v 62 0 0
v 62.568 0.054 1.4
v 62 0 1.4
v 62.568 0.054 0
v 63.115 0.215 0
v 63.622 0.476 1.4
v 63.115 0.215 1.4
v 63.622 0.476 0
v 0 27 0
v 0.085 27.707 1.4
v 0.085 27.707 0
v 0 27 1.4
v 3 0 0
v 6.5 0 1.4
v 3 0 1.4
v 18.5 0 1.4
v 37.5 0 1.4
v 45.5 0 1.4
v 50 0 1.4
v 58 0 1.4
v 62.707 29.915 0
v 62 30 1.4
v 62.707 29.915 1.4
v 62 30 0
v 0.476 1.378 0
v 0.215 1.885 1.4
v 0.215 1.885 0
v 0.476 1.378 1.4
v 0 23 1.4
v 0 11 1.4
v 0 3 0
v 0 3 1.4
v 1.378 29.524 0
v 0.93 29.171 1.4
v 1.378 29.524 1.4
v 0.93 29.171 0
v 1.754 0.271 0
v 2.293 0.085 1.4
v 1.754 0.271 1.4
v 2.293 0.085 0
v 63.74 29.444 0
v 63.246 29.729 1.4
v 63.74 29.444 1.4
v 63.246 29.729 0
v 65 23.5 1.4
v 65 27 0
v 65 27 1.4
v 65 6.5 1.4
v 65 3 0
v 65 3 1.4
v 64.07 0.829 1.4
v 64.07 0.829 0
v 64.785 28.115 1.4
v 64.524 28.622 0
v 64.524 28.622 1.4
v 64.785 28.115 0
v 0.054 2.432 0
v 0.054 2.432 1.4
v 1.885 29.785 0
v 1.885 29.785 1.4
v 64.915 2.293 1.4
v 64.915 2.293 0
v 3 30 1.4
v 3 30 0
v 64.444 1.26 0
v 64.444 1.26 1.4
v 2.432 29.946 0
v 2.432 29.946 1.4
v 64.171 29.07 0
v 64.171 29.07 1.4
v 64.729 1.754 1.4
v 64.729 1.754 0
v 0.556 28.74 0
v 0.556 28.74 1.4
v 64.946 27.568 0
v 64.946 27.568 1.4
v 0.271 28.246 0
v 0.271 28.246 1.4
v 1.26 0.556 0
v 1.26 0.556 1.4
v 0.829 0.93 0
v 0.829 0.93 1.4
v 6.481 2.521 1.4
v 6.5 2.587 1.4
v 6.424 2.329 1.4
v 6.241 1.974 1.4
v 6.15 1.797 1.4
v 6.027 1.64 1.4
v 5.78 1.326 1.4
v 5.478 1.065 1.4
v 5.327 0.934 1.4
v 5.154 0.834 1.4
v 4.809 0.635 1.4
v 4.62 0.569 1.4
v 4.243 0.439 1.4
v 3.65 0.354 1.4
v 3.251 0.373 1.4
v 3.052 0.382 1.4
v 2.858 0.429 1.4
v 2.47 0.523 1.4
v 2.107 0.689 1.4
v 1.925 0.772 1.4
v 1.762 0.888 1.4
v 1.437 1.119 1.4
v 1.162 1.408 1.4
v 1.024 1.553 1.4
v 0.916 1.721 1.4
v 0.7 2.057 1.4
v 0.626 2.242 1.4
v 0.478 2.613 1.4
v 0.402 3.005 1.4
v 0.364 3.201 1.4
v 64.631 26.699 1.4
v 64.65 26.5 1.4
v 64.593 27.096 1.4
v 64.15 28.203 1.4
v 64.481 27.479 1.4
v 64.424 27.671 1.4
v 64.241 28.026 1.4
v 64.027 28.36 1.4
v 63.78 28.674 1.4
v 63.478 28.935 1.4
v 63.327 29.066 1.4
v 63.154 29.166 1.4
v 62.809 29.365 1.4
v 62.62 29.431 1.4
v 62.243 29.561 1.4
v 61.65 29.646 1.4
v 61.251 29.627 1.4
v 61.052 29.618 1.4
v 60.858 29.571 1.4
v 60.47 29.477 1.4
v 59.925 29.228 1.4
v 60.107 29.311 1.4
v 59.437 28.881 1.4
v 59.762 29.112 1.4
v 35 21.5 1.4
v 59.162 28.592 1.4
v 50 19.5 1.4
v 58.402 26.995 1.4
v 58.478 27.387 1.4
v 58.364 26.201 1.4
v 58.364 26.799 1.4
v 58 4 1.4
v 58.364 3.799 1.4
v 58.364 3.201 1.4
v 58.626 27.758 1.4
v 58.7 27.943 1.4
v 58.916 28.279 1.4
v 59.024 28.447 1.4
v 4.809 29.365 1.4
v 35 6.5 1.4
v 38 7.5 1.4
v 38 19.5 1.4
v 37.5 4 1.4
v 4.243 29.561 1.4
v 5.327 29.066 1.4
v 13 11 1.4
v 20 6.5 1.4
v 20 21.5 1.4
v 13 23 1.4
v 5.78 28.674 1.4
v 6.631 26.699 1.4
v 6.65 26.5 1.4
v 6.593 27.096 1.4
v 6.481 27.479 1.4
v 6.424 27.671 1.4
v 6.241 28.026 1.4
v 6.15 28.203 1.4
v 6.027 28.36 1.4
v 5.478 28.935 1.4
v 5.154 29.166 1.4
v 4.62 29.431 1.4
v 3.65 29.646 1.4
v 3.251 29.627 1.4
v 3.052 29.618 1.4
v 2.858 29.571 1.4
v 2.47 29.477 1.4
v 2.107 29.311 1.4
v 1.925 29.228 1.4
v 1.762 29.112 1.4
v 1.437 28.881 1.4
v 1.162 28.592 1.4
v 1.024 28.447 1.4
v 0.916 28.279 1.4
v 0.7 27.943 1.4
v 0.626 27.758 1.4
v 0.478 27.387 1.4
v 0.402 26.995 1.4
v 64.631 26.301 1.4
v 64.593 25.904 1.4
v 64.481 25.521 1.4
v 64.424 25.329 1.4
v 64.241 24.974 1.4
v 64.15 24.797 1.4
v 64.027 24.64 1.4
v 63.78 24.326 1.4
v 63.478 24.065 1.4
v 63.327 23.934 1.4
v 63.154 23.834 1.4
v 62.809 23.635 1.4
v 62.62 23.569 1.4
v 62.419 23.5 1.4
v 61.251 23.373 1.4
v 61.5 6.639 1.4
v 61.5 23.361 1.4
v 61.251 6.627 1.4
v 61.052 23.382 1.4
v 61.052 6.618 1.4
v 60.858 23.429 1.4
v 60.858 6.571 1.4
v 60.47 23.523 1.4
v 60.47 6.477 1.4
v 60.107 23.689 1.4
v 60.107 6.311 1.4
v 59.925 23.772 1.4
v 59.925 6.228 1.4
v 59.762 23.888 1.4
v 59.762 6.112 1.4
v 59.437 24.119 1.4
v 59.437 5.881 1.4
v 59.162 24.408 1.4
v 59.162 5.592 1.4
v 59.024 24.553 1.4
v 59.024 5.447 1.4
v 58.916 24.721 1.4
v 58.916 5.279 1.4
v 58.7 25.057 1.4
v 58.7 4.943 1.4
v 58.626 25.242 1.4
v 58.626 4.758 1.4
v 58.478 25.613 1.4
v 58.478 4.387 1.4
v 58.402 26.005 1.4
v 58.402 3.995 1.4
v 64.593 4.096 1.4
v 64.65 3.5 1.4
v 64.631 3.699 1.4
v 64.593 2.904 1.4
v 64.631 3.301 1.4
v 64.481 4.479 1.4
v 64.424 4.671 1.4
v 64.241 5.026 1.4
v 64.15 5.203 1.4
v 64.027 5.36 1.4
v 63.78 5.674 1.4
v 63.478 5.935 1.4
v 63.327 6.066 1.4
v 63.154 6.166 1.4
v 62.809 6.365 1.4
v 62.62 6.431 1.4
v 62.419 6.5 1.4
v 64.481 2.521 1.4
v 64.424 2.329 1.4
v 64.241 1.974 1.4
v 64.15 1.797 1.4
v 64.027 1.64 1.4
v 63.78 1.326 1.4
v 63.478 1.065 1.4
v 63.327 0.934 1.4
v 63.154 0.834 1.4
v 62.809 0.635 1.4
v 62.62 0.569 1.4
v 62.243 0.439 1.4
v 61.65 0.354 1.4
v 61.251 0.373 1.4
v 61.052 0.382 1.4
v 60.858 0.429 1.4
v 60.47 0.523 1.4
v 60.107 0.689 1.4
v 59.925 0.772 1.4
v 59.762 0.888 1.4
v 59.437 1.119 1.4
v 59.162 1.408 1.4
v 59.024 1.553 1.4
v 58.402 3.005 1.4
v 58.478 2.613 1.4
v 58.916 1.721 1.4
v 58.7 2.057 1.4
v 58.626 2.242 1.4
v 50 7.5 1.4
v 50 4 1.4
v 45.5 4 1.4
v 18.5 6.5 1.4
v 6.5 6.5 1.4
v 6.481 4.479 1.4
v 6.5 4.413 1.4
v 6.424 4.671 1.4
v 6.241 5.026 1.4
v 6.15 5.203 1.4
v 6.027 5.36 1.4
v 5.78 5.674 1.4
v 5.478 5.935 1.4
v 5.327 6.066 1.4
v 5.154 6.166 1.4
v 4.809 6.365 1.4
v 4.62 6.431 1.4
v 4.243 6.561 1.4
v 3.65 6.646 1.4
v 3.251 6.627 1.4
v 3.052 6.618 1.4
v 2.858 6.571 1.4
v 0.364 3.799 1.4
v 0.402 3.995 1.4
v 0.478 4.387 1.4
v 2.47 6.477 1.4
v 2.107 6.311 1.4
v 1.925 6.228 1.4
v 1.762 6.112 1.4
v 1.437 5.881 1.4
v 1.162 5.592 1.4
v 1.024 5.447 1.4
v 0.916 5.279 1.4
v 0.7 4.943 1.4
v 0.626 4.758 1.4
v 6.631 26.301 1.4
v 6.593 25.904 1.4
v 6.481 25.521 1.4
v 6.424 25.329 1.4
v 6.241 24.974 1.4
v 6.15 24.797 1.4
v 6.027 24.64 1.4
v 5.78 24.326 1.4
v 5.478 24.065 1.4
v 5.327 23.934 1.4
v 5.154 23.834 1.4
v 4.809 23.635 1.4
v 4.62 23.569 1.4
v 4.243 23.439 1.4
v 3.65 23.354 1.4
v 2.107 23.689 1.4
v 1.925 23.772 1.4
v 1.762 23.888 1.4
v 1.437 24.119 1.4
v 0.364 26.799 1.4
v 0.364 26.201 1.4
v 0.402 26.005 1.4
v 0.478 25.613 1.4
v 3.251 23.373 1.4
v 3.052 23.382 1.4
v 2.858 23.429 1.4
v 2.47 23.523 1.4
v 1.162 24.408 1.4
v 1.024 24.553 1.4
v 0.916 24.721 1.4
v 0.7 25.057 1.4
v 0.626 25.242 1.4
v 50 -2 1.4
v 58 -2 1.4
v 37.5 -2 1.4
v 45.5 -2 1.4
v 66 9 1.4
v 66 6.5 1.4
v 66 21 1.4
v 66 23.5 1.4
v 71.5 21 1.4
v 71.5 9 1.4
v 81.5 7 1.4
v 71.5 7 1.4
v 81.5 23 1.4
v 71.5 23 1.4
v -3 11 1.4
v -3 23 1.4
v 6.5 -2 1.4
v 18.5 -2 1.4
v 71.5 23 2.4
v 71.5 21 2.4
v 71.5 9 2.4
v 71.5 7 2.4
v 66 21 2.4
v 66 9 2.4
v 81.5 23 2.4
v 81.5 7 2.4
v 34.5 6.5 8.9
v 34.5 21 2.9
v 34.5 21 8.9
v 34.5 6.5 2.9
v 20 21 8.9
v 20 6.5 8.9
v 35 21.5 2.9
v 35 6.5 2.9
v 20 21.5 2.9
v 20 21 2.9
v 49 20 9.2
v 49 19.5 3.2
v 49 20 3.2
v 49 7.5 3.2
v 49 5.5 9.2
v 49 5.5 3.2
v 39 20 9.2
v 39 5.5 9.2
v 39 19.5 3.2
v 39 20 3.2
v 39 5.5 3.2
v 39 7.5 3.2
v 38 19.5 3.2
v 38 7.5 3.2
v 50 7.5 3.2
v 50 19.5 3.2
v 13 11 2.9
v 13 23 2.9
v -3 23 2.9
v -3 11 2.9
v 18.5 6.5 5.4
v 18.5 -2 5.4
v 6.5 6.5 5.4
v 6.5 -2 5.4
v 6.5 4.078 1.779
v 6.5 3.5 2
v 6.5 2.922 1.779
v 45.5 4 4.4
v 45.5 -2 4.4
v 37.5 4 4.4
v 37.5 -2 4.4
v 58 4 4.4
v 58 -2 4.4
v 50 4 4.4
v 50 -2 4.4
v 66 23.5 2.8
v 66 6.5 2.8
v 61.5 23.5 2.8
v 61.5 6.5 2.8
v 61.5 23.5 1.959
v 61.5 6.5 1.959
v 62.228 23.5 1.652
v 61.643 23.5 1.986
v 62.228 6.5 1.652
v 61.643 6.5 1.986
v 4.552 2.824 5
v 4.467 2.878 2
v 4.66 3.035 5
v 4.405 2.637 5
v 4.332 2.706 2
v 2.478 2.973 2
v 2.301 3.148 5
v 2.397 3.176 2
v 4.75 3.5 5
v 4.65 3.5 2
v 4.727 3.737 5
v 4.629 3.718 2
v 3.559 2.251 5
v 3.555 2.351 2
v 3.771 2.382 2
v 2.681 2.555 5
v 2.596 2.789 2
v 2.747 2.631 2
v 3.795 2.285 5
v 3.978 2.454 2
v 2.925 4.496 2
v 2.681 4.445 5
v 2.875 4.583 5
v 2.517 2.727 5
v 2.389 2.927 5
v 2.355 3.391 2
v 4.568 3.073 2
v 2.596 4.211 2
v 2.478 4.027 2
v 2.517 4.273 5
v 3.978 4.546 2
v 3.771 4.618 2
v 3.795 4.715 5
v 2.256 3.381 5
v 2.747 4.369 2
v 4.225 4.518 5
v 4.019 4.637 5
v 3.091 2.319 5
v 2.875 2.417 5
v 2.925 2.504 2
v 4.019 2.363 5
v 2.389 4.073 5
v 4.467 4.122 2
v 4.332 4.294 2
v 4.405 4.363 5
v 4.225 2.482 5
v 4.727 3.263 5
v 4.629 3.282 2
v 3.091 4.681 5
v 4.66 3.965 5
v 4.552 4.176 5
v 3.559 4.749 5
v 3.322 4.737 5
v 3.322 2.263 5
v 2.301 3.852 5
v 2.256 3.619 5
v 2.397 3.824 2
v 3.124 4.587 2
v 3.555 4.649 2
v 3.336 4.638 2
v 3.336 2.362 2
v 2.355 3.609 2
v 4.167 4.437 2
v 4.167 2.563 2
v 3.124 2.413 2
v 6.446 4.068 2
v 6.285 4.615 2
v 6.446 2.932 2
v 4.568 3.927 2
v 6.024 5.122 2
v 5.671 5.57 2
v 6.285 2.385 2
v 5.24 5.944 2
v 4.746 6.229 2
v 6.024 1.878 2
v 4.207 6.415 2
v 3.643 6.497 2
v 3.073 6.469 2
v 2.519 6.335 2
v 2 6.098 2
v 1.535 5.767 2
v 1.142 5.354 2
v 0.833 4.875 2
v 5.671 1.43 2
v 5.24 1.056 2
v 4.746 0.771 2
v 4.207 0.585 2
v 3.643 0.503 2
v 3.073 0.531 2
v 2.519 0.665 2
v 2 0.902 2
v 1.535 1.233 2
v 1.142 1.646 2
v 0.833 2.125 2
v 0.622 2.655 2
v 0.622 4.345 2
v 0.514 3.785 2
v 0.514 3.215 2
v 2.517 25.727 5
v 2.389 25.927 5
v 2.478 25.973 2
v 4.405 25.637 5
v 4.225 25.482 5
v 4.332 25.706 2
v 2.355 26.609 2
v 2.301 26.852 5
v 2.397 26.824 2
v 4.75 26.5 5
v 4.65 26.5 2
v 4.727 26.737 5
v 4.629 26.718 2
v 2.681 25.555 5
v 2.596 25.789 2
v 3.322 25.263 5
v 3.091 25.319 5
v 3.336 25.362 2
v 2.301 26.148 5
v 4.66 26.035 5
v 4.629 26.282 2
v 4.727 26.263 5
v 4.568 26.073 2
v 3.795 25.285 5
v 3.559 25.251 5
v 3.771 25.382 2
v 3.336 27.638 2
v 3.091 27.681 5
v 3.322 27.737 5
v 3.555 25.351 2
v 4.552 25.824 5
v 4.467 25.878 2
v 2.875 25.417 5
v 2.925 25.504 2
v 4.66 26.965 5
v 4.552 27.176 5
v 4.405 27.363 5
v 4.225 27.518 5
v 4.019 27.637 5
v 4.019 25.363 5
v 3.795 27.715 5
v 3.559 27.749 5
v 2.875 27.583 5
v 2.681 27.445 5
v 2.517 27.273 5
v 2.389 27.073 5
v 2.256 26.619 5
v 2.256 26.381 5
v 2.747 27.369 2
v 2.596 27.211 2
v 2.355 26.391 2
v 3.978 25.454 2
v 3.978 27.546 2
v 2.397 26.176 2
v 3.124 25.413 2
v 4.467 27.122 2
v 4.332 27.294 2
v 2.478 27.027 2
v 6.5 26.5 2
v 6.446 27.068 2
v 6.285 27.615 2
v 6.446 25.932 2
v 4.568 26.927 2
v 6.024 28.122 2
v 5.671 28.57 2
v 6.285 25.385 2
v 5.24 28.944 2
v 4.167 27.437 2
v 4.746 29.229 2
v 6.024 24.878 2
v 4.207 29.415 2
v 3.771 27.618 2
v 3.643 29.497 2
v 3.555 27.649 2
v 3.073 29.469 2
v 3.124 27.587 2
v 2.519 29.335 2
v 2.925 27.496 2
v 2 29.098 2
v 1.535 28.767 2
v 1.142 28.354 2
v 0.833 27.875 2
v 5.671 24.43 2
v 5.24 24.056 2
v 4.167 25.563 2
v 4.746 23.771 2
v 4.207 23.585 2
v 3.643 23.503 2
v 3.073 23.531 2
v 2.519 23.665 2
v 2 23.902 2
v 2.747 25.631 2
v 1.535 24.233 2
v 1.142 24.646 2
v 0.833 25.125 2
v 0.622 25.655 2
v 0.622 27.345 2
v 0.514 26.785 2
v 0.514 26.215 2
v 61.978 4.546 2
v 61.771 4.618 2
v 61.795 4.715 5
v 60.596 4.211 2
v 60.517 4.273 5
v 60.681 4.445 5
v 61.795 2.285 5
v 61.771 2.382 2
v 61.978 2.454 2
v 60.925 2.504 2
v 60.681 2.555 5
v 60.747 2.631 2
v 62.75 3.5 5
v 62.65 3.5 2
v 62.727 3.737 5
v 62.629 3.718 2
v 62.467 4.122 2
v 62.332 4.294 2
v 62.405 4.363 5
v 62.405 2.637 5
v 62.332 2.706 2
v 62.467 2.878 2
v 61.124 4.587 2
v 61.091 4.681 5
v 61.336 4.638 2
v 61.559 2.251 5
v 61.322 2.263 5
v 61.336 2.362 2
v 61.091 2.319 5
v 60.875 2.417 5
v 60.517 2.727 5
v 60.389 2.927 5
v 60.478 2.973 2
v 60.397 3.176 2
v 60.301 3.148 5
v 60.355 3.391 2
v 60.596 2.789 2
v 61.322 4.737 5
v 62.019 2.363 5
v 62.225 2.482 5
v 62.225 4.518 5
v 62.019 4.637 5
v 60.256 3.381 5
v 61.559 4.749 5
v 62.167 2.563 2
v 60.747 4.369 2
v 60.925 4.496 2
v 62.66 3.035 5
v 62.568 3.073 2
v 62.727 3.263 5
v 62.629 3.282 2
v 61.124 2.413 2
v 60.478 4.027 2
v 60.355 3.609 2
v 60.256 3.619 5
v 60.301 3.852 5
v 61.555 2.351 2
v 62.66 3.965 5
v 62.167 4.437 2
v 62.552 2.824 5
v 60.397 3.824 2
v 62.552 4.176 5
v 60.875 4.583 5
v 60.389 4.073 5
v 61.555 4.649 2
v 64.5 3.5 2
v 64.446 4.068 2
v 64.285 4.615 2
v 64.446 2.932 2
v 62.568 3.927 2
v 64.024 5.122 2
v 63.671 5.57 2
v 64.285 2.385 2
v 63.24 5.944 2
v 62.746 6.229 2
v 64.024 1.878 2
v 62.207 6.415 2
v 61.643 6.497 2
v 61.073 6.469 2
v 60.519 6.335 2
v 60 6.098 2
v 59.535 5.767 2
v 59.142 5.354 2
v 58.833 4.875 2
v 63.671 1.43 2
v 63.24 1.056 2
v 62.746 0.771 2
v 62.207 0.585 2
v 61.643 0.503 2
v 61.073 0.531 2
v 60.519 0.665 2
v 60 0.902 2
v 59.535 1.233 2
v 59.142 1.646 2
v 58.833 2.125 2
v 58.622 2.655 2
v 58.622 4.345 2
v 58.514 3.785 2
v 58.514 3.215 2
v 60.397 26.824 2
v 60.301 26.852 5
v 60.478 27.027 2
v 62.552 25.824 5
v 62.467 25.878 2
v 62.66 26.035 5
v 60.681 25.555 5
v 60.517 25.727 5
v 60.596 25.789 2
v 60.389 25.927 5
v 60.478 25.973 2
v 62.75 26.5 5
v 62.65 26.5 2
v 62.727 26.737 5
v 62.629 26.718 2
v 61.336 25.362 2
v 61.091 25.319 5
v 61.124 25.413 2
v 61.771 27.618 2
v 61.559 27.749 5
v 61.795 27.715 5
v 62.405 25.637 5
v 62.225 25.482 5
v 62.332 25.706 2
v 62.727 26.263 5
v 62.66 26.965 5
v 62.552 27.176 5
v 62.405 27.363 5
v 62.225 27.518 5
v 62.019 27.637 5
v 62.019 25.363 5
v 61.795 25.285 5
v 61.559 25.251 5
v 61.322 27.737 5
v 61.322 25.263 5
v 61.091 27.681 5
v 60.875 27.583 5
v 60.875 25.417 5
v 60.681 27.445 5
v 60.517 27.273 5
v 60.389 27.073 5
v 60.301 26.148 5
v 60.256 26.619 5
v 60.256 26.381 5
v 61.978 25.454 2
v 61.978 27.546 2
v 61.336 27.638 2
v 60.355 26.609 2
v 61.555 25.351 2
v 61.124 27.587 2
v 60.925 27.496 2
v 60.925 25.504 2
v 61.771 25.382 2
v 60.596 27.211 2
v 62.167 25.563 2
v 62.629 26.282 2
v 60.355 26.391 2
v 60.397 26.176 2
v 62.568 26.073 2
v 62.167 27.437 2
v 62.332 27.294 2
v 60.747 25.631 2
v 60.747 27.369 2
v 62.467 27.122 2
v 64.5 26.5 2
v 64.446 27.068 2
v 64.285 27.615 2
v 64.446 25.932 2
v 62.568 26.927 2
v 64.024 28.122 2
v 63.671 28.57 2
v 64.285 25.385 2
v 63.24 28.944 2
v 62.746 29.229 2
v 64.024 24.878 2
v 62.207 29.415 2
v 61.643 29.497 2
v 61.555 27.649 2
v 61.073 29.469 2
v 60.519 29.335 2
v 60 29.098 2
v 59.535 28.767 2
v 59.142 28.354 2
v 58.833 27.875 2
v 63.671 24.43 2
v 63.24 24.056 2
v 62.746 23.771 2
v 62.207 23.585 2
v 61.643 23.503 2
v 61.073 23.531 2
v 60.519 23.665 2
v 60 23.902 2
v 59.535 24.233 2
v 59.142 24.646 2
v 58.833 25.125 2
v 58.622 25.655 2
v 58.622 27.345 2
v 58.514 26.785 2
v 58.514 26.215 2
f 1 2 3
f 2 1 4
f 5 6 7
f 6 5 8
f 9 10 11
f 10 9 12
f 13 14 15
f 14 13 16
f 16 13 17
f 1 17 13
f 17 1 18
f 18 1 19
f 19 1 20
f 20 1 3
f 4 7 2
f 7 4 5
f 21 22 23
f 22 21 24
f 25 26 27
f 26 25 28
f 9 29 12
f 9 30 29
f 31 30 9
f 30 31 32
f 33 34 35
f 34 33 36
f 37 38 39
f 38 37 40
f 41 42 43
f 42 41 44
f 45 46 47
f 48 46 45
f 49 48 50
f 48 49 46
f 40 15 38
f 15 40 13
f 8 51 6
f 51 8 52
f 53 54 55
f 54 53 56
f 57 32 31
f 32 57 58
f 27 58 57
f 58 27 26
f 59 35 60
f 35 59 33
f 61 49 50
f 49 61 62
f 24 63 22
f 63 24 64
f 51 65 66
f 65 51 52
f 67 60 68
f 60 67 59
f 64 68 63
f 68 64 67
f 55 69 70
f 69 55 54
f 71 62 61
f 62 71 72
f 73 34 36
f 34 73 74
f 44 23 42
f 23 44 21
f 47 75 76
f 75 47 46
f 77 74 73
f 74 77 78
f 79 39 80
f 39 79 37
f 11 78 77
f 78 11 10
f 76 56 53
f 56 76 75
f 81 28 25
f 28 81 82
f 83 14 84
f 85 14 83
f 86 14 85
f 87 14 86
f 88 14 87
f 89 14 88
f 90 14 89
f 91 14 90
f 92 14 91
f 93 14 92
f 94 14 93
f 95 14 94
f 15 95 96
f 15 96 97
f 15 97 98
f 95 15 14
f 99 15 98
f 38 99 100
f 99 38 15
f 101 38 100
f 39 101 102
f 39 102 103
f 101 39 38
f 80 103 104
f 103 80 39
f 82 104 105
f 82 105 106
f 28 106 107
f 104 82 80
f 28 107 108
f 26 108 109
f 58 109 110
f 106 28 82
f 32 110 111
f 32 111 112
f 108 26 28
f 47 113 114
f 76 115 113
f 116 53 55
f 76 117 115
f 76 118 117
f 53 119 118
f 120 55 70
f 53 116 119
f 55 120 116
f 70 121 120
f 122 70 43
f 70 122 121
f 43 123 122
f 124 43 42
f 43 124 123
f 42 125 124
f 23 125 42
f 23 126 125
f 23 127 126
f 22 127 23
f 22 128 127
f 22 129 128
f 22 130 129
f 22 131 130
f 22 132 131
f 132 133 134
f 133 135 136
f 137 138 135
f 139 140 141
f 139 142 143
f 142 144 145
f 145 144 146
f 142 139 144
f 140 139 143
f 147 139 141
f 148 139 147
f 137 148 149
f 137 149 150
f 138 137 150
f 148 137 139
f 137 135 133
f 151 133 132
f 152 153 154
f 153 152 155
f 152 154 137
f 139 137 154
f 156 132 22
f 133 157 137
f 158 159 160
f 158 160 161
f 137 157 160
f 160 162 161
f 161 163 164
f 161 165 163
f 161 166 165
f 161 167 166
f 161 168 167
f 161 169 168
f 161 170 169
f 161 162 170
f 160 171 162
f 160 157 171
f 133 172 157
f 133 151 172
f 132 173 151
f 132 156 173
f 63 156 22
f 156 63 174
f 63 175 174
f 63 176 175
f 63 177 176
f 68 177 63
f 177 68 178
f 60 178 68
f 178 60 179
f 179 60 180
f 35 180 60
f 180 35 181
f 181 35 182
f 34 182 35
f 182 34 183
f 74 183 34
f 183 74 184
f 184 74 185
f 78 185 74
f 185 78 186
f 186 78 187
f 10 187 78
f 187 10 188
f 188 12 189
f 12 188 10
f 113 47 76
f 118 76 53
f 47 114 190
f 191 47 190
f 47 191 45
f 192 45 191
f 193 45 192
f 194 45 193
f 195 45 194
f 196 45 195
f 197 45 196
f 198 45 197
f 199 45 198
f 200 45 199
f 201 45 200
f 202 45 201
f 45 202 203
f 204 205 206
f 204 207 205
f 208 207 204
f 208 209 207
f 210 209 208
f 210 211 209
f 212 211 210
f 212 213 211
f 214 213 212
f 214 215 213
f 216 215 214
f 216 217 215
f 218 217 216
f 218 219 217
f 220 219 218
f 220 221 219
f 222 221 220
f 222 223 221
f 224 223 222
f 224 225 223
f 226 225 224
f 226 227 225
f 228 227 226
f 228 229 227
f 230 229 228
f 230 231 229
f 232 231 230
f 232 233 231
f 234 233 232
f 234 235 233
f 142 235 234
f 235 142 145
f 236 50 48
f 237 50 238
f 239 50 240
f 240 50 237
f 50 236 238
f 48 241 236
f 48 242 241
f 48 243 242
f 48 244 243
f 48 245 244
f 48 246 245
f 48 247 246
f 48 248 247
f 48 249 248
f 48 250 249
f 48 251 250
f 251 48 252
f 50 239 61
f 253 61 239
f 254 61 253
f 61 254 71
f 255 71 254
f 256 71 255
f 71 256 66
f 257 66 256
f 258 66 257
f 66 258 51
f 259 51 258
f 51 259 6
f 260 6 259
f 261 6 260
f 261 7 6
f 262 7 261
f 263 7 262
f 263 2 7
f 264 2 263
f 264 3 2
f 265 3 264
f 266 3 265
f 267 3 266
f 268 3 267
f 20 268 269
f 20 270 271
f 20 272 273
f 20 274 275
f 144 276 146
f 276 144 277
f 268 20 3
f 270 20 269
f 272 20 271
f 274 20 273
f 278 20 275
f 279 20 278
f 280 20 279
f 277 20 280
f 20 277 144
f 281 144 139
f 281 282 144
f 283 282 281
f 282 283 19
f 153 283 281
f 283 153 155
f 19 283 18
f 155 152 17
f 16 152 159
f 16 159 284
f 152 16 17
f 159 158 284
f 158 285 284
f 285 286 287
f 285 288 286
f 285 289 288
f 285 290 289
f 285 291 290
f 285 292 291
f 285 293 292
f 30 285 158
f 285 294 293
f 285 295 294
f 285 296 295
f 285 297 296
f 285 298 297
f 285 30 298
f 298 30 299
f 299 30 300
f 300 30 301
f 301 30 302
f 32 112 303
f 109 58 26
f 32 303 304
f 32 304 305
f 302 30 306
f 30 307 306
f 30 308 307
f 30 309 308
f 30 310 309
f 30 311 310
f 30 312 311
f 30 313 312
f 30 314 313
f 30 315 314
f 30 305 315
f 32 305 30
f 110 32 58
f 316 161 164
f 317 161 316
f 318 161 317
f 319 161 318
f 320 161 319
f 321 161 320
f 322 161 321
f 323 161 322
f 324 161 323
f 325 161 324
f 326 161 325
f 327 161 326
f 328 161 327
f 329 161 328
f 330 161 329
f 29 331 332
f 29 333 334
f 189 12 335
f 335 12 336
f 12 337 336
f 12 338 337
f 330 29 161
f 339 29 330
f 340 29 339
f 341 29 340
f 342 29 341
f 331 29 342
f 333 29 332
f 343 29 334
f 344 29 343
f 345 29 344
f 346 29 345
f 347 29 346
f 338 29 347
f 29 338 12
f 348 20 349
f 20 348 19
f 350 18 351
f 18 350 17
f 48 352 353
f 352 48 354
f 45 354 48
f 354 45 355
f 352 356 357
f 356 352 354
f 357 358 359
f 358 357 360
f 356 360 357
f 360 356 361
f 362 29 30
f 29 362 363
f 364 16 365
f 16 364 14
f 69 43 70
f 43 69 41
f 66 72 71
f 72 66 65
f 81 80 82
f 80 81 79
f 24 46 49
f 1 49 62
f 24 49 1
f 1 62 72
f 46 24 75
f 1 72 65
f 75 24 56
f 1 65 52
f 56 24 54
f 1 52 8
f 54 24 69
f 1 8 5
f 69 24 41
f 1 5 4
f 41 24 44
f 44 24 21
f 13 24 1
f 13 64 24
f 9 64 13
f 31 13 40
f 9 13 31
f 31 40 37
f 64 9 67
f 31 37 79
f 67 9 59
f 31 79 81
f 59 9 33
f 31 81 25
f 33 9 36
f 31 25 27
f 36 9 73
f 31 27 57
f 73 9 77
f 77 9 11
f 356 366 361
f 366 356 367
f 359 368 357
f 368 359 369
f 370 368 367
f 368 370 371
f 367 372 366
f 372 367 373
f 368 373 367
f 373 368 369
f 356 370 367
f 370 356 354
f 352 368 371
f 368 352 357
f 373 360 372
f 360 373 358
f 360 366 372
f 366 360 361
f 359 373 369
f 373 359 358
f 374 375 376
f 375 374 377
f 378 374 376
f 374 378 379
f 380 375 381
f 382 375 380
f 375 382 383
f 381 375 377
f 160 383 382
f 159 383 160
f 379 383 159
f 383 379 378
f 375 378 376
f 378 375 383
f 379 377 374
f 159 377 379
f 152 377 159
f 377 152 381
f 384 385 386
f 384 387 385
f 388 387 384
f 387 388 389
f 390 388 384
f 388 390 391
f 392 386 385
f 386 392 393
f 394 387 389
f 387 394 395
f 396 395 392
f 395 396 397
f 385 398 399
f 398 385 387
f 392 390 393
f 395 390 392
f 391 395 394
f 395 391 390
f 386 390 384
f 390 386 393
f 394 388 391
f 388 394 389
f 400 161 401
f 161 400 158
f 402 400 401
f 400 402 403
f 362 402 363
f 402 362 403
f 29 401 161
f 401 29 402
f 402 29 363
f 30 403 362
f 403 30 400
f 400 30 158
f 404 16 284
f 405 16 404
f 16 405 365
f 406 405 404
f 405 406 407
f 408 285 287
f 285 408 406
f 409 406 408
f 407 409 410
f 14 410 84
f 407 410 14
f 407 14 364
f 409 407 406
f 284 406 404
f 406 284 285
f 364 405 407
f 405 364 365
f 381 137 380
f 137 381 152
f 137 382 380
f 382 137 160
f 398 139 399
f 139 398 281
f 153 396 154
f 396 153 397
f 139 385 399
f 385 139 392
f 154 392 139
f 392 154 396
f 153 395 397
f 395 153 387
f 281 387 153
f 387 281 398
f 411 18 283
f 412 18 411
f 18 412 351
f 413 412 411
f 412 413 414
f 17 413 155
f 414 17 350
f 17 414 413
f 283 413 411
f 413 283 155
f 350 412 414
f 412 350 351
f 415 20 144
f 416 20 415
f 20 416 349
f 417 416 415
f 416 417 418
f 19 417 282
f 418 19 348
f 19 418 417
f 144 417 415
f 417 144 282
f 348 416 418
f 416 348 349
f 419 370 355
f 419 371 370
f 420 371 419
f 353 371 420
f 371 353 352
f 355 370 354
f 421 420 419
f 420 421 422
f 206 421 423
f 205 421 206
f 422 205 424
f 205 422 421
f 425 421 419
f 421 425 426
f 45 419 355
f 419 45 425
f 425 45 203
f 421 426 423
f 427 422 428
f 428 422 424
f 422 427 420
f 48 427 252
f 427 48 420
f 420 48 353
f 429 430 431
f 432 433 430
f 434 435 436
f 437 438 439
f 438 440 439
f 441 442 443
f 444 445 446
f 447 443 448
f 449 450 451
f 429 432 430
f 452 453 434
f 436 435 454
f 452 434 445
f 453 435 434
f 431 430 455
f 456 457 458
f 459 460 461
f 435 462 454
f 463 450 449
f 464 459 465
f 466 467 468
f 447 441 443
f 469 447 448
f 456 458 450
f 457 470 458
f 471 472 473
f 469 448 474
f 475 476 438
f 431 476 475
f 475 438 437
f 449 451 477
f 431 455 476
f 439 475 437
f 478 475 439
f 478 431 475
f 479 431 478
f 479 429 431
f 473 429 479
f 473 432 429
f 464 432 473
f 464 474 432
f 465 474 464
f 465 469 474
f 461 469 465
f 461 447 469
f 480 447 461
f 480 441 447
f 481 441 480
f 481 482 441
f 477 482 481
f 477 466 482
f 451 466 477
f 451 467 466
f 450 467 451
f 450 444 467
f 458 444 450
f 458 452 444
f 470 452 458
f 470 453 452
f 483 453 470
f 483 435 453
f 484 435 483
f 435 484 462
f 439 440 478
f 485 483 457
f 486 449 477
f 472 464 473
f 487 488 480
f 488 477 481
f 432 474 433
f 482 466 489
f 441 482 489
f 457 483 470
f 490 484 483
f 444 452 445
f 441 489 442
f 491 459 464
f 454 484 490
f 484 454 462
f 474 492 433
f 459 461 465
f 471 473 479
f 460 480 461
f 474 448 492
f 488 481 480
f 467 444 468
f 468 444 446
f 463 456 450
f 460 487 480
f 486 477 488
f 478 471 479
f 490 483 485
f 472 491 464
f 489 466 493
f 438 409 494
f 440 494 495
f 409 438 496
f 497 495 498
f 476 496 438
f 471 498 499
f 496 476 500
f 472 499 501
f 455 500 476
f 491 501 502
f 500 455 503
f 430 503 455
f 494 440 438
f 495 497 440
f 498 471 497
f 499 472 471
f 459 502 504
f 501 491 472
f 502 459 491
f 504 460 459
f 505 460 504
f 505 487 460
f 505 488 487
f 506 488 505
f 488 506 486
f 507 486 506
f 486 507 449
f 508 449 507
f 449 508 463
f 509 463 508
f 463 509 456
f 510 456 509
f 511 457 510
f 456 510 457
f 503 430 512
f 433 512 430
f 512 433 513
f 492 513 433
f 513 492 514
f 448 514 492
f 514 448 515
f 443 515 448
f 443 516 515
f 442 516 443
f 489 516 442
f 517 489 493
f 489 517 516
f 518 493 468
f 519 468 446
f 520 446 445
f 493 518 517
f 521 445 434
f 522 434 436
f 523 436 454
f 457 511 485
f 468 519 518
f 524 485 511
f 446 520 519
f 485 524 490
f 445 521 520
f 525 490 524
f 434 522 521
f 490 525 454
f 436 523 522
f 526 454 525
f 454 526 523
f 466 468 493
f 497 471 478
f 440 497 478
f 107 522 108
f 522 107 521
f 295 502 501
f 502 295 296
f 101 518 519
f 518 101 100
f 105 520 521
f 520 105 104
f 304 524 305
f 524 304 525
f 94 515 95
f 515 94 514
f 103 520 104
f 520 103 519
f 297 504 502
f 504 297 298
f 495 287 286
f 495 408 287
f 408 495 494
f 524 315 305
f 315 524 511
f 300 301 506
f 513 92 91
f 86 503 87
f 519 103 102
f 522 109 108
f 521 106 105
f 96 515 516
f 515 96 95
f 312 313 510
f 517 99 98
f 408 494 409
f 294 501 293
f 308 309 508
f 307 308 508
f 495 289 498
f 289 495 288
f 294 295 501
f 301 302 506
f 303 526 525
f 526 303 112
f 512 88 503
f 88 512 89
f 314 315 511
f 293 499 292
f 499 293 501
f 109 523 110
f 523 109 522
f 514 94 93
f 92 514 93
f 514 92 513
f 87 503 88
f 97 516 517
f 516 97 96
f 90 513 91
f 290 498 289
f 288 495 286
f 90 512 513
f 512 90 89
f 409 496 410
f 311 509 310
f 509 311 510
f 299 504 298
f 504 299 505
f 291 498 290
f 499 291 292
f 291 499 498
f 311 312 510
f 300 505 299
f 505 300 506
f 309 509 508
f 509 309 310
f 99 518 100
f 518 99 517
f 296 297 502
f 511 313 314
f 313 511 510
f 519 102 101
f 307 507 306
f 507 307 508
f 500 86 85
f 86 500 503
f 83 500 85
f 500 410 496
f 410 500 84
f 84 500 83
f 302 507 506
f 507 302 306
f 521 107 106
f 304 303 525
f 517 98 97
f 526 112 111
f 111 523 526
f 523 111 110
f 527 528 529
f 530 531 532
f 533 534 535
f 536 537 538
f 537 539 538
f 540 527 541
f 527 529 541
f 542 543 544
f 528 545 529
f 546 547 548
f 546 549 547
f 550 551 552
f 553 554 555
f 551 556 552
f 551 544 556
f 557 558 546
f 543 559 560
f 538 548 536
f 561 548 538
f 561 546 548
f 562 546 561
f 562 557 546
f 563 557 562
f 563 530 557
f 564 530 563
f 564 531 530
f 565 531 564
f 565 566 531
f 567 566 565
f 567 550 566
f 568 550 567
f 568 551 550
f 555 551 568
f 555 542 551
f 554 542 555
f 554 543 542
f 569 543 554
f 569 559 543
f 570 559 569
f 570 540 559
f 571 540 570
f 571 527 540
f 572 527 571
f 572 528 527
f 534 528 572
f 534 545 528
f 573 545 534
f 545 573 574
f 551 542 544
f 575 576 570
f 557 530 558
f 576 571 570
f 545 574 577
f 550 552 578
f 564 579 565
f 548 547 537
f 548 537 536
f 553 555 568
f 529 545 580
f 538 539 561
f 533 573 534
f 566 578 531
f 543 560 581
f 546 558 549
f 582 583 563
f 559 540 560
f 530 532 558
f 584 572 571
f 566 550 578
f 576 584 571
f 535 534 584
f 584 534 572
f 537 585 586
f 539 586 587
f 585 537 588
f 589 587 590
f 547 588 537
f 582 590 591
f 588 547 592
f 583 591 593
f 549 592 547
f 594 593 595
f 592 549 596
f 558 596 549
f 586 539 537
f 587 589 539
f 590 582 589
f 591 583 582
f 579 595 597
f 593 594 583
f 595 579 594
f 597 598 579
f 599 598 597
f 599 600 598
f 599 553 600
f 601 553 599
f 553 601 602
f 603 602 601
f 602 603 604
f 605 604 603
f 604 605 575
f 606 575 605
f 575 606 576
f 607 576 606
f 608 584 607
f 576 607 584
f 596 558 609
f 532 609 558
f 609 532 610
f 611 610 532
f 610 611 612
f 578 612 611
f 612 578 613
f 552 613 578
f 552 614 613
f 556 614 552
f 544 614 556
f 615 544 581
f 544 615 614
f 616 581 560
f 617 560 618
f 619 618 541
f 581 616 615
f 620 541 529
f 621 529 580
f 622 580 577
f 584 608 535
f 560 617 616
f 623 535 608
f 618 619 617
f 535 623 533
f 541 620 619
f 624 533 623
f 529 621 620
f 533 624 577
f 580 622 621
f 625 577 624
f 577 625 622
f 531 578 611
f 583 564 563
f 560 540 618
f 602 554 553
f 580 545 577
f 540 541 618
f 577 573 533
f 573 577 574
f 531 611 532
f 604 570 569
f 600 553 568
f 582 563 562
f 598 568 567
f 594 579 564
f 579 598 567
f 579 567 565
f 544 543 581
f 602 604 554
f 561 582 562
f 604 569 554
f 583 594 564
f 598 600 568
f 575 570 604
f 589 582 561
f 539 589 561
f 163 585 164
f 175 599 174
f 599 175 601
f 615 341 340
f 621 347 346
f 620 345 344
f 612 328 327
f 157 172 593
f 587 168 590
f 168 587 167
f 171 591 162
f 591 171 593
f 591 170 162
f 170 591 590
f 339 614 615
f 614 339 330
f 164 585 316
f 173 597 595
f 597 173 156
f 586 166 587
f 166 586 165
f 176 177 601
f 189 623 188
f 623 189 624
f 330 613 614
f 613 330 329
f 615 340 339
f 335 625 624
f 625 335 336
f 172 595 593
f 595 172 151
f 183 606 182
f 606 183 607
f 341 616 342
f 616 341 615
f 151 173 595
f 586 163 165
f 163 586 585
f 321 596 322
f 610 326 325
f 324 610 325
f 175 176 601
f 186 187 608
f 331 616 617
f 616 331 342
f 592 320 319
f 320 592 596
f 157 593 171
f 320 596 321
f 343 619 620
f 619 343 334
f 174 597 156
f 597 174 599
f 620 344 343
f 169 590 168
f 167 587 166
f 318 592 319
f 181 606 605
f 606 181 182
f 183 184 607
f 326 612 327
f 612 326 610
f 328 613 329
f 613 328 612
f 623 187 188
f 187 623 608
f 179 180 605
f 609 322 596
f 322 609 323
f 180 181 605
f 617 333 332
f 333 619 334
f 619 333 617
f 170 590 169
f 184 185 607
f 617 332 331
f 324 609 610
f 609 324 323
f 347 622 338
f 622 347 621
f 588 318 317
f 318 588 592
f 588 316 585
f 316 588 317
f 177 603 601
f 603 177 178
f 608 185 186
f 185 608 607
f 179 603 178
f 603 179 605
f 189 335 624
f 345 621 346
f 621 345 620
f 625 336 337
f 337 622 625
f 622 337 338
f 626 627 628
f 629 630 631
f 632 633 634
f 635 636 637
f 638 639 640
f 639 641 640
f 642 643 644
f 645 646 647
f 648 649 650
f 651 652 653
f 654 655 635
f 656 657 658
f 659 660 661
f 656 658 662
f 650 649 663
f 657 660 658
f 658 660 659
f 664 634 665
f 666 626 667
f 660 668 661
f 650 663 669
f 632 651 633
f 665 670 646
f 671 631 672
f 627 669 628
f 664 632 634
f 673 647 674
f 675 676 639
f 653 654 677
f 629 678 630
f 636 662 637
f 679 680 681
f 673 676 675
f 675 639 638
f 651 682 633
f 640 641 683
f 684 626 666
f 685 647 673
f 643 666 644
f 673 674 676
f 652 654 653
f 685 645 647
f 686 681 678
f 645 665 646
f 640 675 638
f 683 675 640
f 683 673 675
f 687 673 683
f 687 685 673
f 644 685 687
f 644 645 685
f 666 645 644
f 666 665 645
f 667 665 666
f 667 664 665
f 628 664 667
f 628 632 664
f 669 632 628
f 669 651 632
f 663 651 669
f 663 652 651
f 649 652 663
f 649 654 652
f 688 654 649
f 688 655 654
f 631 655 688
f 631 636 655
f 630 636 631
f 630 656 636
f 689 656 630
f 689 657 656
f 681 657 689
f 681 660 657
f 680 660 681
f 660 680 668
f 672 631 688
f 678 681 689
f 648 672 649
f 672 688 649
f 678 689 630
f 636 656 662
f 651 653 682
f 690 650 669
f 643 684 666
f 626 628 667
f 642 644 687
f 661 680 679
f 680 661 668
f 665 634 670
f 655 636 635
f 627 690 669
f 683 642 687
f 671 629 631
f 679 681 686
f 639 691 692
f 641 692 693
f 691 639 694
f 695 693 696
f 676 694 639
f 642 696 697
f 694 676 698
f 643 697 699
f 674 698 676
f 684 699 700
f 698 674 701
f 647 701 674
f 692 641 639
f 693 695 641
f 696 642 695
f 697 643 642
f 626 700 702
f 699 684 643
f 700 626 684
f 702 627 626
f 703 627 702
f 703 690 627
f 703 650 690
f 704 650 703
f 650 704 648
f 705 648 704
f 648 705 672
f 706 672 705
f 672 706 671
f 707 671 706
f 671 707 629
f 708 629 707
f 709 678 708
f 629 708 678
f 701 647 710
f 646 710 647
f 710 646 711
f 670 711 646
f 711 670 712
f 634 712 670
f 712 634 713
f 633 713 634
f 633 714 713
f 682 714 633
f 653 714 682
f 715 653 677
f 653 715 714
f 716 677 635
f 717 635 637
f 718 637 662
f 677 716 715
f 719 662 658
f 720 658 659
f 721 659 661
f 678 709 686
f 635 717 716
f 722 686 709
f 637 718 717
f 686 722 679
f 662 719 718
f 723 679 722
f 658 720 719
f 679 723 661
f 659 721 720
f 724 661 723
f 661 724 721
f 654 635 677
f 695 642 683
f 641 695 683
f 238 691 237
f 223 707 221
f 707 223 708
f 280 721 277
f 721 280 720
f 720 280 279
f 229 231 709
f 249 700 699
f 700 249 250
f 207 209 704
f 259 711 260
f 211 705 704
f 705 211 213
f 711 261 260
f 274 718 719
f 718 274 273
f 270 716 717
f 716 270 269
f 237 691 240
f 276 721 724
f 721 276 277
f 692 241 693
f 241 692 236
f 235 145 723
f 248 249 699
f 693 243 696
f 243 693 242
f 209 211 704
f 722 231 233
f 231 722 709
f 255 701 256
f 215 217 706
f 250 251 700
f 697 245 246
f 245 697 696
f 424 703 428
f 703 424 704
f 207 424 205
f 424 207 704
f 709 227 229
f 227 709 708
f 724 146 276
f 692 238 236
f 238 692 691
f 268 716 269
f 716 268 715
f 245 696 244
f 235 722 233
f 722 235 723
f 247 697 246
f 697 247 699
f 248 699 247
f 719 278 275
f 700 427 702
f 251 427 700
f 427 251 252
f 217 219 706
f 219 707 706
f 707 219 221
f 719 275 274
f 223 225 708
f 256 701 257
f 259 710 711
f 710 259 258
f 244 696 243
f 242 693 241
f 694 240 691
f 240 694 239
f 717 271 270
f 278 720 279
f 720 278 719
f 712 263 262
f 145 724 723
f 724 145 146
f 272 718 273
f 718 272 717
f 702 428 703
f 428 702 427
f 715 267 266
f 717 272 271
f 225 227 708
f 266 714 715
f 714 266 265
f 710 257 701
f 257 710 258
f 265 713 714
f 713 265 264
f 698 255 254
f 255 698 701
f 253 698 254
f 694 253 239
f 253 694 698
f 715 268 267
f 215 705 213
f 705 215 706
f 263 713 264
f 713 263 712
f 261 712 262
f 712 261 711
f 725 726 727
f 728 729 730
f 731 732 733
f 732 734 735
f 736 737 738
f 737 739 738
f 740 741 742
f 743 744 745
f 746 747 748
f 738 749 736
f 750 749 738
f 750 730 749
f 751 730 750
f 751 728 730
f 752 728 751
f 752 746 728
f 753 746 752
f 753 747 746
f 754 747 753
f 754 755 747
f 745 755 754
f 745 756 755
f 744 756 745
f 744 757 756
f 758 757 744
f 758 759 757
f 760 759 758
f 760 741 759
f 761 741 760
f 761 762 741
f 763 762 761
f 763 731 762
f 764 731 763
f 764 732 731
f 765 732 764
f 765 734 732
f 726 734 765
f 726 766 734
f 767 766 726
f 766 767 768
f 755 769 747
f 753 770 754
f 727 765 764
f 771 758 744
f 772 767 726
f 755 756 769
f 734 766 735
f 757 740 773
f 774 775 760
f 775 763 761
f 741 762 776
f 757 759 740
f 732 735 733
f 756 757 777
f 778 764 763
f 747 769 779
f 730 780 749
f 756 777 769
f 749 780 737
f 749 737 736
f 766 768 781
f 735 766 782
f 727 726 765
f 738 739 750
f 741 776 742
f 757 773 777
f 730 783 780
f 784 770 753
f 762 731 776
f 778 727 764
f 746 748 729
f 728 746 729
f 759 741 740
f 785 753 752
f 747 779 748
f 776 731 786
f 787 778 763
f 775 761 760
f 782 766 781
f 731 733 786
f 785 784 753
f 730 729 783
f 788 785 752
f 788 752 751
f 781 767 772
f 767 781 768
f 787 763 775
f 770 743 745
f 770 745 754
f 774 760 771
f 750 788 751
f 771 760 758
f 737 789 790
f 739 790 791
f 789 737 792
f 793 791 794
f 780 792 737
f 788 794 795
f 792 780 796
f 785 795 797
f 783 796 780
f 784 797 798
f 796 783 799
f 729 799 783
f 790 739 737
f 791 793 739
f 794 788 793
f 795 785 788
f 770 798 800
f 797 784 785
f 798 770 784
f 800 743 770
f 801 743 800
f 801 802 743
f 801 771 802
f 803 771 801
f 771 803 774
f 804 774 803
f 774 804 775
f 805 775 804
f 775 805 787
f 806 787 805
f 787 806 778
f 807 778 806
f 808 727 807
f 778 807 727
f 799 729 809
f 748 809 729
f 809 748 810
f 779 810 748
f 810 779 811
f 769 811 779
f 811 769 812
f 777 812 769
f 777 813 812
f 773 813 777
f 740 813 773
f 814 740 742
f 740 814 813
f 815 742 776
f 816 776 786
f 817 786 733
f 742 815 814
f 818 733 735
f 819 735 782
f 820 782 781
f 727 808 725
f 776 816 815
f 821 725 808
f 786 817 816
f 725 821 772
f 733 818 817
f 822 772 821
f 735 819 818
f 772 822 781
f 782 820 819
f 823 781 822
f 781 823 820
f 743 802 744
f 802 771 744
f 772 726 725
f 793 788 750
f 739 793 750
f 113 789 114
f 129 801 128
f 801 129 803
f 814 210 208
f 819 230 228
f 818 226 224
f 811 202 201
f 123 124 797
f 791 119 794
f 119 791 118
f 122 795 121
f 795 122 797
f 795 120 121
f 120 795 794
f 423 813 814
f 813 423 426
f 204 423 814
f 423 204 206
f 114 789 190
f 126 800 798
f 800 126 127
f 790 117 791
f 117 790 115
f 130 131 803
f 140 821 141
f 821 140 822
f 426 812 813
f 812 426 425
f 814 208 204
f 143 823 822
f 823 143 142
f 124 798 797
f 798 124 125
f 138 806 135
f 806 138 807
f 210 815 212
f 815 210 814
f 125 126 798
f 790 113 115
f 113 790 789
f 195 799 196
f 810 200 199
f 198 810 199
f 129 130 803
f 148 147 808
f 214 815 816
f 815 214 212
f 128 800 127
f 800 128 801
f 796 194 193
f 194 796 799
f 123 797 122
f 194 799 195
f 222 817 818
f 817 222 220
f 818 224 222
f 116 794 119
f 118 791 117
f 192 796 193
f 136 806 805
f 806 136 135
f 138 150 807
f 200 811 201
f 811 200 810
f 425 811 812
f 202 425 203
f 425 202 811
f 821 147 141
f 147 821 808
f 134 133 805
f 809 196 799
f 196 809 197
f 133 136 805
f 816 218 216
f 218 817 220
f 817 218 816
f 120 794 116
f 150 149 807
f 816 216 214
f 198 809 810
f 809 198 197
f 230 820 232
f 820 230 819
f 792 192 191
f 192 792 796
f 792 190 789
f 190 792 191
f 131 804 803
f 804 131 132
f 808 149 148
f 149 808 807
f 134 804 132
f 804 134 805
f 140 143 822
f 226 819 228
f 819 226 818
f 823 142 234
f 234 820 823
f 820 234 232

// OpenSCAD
//======================================================================
// pi0.scad
//
// This is a Raspberry Pi Zero W 2
// Beware that heat sinks may be slightly misplaced, leave extra space!
//
// DrTomFlint, 19 Oct 2024
//======================================================================



//----------------------------------------------------------------------
module pi0pegs(zBase=2,zPeg=3){

r0=3.0;       // radius of pcb corners
thick=1.4;    // pcb thickness
x0=65.0;
y0=30.0;  

F2=33;
  
    // mounting pegs  
    translate([r0,r0,0]){
      translate([0.5,0.5,zBase])
      cylinder(r1=1.15,r2=1.25,h=zPeg,$fn=F2);
      translate([0.5,0.5,0])
      cylinder(r1=3.5,r2=3,h=zBase,$fn=F2);

      translate([0.5,y0-2*r0-0.5,zBase])      
      cylinder(r1=1.15,r2=1.25,h=zPeg,$fn=F2);
      translate([0.5,y0-2*r0-0.5,0])      
      cylinder(r1=3.5,r2=3,h=zBase,$fn=F2);
      
      translate([x0-2*r0-0.5,0.5,zBase])
      cylinder(r1=1.15,r2=1.25,h=zPeg,$fn=F2);
      translate([x0-2*r0-0.5,0.5,0])
      cylinder(r1=3.5,r2=3,h=zBase,$fn=F2);
      
      translate([x0-2*r0-0.5,y0-2*r0-0.5,zBase])
      cylinder(r1=1.15,r2=1.25,h=zPeg,$fn=F2);
      translate([x0-2*r0-0.5,y0-2*r0-0.5,0])
      cylinder(r1=3.5,r2=3,h=zBase,$fn=F2);
    }
}

//----------------------------------------------------------------------
module pi0(cam=10,heatsink=1){

r0=3.0;       // radius of pcb corners
thick=1.4;    // pcb thickness
x0=65.0;
y0=30.0;  

F2=33;
  
  // pcb
  translate([r0,r0,0])
  difference(){
    linear_extrude(height=thick)
    offset(r=r0,$fn=F2)
    square([x0-2*r0,y0-2*r0]);

    // mounting holes  
    translate([0.5,0.5,0])
    cylinder(r=1.3,h=4*thick,center=true,$fn=F2);
    translate([0.5,y0-2*r0-0.5,0])
    cylinder(r=1.3,h=4*thick,center=true,$fn=F2);
    translate([x0-2*r0-0.5,0.5,0])
    cylinder(r=1.3,h=4*thick,center=true,$fn=F2);
    translate([x0-2*r0-0.5,y0-2*r0-0.5,0])
    cylinder(r=1.3,h=4*thick,center=true,$fn=F2);
  }
  
  // SD card
  translate([-3,11,thick])
  cube([16,12,1.5]);
  
  // HDMI
  translate([6.5,-2,thick])
  cube([12,8.5,4]);
  
  // RP3A0-AU Processor
  translate([20,6.5,thick])
  cube([15,15,1.5]);
  
  // RF chip
  translate([38,7.5,thick])
  cube([12,12,1.8]);
  
  // USB OTG
  translate([37.5,-2,thick])
  cube([8,6,3]);
  
  // USB Power
  translate([50,-2,thick])
  cube([8,6,3]);
  
  // CSI 
  translate([61.5,6.5,thick])
  cube([4.5,17,1.4]);
  
  // Camera cable
  if(cam>0){
    // narrow section
    translate([x0,9,thick])
    cube([6.5,12,1]);    
    // wider section
    translate([x0+6.5,7,thick])
    cube([cam,16,1]);    
  }
  
  // 
  if(heatsink==1){
    // Processor heatsink
    translate([20,6.5,thick+1.5])
    cube([14.5,14.5,6]);    
    // RF heatsink
    translate([38+1,7.5-2,thick+1.8])
    cube([10,14.5,6]);    
  }
  
}

//======================================================================

pi0();
pi0pegs();

//======================================================================
